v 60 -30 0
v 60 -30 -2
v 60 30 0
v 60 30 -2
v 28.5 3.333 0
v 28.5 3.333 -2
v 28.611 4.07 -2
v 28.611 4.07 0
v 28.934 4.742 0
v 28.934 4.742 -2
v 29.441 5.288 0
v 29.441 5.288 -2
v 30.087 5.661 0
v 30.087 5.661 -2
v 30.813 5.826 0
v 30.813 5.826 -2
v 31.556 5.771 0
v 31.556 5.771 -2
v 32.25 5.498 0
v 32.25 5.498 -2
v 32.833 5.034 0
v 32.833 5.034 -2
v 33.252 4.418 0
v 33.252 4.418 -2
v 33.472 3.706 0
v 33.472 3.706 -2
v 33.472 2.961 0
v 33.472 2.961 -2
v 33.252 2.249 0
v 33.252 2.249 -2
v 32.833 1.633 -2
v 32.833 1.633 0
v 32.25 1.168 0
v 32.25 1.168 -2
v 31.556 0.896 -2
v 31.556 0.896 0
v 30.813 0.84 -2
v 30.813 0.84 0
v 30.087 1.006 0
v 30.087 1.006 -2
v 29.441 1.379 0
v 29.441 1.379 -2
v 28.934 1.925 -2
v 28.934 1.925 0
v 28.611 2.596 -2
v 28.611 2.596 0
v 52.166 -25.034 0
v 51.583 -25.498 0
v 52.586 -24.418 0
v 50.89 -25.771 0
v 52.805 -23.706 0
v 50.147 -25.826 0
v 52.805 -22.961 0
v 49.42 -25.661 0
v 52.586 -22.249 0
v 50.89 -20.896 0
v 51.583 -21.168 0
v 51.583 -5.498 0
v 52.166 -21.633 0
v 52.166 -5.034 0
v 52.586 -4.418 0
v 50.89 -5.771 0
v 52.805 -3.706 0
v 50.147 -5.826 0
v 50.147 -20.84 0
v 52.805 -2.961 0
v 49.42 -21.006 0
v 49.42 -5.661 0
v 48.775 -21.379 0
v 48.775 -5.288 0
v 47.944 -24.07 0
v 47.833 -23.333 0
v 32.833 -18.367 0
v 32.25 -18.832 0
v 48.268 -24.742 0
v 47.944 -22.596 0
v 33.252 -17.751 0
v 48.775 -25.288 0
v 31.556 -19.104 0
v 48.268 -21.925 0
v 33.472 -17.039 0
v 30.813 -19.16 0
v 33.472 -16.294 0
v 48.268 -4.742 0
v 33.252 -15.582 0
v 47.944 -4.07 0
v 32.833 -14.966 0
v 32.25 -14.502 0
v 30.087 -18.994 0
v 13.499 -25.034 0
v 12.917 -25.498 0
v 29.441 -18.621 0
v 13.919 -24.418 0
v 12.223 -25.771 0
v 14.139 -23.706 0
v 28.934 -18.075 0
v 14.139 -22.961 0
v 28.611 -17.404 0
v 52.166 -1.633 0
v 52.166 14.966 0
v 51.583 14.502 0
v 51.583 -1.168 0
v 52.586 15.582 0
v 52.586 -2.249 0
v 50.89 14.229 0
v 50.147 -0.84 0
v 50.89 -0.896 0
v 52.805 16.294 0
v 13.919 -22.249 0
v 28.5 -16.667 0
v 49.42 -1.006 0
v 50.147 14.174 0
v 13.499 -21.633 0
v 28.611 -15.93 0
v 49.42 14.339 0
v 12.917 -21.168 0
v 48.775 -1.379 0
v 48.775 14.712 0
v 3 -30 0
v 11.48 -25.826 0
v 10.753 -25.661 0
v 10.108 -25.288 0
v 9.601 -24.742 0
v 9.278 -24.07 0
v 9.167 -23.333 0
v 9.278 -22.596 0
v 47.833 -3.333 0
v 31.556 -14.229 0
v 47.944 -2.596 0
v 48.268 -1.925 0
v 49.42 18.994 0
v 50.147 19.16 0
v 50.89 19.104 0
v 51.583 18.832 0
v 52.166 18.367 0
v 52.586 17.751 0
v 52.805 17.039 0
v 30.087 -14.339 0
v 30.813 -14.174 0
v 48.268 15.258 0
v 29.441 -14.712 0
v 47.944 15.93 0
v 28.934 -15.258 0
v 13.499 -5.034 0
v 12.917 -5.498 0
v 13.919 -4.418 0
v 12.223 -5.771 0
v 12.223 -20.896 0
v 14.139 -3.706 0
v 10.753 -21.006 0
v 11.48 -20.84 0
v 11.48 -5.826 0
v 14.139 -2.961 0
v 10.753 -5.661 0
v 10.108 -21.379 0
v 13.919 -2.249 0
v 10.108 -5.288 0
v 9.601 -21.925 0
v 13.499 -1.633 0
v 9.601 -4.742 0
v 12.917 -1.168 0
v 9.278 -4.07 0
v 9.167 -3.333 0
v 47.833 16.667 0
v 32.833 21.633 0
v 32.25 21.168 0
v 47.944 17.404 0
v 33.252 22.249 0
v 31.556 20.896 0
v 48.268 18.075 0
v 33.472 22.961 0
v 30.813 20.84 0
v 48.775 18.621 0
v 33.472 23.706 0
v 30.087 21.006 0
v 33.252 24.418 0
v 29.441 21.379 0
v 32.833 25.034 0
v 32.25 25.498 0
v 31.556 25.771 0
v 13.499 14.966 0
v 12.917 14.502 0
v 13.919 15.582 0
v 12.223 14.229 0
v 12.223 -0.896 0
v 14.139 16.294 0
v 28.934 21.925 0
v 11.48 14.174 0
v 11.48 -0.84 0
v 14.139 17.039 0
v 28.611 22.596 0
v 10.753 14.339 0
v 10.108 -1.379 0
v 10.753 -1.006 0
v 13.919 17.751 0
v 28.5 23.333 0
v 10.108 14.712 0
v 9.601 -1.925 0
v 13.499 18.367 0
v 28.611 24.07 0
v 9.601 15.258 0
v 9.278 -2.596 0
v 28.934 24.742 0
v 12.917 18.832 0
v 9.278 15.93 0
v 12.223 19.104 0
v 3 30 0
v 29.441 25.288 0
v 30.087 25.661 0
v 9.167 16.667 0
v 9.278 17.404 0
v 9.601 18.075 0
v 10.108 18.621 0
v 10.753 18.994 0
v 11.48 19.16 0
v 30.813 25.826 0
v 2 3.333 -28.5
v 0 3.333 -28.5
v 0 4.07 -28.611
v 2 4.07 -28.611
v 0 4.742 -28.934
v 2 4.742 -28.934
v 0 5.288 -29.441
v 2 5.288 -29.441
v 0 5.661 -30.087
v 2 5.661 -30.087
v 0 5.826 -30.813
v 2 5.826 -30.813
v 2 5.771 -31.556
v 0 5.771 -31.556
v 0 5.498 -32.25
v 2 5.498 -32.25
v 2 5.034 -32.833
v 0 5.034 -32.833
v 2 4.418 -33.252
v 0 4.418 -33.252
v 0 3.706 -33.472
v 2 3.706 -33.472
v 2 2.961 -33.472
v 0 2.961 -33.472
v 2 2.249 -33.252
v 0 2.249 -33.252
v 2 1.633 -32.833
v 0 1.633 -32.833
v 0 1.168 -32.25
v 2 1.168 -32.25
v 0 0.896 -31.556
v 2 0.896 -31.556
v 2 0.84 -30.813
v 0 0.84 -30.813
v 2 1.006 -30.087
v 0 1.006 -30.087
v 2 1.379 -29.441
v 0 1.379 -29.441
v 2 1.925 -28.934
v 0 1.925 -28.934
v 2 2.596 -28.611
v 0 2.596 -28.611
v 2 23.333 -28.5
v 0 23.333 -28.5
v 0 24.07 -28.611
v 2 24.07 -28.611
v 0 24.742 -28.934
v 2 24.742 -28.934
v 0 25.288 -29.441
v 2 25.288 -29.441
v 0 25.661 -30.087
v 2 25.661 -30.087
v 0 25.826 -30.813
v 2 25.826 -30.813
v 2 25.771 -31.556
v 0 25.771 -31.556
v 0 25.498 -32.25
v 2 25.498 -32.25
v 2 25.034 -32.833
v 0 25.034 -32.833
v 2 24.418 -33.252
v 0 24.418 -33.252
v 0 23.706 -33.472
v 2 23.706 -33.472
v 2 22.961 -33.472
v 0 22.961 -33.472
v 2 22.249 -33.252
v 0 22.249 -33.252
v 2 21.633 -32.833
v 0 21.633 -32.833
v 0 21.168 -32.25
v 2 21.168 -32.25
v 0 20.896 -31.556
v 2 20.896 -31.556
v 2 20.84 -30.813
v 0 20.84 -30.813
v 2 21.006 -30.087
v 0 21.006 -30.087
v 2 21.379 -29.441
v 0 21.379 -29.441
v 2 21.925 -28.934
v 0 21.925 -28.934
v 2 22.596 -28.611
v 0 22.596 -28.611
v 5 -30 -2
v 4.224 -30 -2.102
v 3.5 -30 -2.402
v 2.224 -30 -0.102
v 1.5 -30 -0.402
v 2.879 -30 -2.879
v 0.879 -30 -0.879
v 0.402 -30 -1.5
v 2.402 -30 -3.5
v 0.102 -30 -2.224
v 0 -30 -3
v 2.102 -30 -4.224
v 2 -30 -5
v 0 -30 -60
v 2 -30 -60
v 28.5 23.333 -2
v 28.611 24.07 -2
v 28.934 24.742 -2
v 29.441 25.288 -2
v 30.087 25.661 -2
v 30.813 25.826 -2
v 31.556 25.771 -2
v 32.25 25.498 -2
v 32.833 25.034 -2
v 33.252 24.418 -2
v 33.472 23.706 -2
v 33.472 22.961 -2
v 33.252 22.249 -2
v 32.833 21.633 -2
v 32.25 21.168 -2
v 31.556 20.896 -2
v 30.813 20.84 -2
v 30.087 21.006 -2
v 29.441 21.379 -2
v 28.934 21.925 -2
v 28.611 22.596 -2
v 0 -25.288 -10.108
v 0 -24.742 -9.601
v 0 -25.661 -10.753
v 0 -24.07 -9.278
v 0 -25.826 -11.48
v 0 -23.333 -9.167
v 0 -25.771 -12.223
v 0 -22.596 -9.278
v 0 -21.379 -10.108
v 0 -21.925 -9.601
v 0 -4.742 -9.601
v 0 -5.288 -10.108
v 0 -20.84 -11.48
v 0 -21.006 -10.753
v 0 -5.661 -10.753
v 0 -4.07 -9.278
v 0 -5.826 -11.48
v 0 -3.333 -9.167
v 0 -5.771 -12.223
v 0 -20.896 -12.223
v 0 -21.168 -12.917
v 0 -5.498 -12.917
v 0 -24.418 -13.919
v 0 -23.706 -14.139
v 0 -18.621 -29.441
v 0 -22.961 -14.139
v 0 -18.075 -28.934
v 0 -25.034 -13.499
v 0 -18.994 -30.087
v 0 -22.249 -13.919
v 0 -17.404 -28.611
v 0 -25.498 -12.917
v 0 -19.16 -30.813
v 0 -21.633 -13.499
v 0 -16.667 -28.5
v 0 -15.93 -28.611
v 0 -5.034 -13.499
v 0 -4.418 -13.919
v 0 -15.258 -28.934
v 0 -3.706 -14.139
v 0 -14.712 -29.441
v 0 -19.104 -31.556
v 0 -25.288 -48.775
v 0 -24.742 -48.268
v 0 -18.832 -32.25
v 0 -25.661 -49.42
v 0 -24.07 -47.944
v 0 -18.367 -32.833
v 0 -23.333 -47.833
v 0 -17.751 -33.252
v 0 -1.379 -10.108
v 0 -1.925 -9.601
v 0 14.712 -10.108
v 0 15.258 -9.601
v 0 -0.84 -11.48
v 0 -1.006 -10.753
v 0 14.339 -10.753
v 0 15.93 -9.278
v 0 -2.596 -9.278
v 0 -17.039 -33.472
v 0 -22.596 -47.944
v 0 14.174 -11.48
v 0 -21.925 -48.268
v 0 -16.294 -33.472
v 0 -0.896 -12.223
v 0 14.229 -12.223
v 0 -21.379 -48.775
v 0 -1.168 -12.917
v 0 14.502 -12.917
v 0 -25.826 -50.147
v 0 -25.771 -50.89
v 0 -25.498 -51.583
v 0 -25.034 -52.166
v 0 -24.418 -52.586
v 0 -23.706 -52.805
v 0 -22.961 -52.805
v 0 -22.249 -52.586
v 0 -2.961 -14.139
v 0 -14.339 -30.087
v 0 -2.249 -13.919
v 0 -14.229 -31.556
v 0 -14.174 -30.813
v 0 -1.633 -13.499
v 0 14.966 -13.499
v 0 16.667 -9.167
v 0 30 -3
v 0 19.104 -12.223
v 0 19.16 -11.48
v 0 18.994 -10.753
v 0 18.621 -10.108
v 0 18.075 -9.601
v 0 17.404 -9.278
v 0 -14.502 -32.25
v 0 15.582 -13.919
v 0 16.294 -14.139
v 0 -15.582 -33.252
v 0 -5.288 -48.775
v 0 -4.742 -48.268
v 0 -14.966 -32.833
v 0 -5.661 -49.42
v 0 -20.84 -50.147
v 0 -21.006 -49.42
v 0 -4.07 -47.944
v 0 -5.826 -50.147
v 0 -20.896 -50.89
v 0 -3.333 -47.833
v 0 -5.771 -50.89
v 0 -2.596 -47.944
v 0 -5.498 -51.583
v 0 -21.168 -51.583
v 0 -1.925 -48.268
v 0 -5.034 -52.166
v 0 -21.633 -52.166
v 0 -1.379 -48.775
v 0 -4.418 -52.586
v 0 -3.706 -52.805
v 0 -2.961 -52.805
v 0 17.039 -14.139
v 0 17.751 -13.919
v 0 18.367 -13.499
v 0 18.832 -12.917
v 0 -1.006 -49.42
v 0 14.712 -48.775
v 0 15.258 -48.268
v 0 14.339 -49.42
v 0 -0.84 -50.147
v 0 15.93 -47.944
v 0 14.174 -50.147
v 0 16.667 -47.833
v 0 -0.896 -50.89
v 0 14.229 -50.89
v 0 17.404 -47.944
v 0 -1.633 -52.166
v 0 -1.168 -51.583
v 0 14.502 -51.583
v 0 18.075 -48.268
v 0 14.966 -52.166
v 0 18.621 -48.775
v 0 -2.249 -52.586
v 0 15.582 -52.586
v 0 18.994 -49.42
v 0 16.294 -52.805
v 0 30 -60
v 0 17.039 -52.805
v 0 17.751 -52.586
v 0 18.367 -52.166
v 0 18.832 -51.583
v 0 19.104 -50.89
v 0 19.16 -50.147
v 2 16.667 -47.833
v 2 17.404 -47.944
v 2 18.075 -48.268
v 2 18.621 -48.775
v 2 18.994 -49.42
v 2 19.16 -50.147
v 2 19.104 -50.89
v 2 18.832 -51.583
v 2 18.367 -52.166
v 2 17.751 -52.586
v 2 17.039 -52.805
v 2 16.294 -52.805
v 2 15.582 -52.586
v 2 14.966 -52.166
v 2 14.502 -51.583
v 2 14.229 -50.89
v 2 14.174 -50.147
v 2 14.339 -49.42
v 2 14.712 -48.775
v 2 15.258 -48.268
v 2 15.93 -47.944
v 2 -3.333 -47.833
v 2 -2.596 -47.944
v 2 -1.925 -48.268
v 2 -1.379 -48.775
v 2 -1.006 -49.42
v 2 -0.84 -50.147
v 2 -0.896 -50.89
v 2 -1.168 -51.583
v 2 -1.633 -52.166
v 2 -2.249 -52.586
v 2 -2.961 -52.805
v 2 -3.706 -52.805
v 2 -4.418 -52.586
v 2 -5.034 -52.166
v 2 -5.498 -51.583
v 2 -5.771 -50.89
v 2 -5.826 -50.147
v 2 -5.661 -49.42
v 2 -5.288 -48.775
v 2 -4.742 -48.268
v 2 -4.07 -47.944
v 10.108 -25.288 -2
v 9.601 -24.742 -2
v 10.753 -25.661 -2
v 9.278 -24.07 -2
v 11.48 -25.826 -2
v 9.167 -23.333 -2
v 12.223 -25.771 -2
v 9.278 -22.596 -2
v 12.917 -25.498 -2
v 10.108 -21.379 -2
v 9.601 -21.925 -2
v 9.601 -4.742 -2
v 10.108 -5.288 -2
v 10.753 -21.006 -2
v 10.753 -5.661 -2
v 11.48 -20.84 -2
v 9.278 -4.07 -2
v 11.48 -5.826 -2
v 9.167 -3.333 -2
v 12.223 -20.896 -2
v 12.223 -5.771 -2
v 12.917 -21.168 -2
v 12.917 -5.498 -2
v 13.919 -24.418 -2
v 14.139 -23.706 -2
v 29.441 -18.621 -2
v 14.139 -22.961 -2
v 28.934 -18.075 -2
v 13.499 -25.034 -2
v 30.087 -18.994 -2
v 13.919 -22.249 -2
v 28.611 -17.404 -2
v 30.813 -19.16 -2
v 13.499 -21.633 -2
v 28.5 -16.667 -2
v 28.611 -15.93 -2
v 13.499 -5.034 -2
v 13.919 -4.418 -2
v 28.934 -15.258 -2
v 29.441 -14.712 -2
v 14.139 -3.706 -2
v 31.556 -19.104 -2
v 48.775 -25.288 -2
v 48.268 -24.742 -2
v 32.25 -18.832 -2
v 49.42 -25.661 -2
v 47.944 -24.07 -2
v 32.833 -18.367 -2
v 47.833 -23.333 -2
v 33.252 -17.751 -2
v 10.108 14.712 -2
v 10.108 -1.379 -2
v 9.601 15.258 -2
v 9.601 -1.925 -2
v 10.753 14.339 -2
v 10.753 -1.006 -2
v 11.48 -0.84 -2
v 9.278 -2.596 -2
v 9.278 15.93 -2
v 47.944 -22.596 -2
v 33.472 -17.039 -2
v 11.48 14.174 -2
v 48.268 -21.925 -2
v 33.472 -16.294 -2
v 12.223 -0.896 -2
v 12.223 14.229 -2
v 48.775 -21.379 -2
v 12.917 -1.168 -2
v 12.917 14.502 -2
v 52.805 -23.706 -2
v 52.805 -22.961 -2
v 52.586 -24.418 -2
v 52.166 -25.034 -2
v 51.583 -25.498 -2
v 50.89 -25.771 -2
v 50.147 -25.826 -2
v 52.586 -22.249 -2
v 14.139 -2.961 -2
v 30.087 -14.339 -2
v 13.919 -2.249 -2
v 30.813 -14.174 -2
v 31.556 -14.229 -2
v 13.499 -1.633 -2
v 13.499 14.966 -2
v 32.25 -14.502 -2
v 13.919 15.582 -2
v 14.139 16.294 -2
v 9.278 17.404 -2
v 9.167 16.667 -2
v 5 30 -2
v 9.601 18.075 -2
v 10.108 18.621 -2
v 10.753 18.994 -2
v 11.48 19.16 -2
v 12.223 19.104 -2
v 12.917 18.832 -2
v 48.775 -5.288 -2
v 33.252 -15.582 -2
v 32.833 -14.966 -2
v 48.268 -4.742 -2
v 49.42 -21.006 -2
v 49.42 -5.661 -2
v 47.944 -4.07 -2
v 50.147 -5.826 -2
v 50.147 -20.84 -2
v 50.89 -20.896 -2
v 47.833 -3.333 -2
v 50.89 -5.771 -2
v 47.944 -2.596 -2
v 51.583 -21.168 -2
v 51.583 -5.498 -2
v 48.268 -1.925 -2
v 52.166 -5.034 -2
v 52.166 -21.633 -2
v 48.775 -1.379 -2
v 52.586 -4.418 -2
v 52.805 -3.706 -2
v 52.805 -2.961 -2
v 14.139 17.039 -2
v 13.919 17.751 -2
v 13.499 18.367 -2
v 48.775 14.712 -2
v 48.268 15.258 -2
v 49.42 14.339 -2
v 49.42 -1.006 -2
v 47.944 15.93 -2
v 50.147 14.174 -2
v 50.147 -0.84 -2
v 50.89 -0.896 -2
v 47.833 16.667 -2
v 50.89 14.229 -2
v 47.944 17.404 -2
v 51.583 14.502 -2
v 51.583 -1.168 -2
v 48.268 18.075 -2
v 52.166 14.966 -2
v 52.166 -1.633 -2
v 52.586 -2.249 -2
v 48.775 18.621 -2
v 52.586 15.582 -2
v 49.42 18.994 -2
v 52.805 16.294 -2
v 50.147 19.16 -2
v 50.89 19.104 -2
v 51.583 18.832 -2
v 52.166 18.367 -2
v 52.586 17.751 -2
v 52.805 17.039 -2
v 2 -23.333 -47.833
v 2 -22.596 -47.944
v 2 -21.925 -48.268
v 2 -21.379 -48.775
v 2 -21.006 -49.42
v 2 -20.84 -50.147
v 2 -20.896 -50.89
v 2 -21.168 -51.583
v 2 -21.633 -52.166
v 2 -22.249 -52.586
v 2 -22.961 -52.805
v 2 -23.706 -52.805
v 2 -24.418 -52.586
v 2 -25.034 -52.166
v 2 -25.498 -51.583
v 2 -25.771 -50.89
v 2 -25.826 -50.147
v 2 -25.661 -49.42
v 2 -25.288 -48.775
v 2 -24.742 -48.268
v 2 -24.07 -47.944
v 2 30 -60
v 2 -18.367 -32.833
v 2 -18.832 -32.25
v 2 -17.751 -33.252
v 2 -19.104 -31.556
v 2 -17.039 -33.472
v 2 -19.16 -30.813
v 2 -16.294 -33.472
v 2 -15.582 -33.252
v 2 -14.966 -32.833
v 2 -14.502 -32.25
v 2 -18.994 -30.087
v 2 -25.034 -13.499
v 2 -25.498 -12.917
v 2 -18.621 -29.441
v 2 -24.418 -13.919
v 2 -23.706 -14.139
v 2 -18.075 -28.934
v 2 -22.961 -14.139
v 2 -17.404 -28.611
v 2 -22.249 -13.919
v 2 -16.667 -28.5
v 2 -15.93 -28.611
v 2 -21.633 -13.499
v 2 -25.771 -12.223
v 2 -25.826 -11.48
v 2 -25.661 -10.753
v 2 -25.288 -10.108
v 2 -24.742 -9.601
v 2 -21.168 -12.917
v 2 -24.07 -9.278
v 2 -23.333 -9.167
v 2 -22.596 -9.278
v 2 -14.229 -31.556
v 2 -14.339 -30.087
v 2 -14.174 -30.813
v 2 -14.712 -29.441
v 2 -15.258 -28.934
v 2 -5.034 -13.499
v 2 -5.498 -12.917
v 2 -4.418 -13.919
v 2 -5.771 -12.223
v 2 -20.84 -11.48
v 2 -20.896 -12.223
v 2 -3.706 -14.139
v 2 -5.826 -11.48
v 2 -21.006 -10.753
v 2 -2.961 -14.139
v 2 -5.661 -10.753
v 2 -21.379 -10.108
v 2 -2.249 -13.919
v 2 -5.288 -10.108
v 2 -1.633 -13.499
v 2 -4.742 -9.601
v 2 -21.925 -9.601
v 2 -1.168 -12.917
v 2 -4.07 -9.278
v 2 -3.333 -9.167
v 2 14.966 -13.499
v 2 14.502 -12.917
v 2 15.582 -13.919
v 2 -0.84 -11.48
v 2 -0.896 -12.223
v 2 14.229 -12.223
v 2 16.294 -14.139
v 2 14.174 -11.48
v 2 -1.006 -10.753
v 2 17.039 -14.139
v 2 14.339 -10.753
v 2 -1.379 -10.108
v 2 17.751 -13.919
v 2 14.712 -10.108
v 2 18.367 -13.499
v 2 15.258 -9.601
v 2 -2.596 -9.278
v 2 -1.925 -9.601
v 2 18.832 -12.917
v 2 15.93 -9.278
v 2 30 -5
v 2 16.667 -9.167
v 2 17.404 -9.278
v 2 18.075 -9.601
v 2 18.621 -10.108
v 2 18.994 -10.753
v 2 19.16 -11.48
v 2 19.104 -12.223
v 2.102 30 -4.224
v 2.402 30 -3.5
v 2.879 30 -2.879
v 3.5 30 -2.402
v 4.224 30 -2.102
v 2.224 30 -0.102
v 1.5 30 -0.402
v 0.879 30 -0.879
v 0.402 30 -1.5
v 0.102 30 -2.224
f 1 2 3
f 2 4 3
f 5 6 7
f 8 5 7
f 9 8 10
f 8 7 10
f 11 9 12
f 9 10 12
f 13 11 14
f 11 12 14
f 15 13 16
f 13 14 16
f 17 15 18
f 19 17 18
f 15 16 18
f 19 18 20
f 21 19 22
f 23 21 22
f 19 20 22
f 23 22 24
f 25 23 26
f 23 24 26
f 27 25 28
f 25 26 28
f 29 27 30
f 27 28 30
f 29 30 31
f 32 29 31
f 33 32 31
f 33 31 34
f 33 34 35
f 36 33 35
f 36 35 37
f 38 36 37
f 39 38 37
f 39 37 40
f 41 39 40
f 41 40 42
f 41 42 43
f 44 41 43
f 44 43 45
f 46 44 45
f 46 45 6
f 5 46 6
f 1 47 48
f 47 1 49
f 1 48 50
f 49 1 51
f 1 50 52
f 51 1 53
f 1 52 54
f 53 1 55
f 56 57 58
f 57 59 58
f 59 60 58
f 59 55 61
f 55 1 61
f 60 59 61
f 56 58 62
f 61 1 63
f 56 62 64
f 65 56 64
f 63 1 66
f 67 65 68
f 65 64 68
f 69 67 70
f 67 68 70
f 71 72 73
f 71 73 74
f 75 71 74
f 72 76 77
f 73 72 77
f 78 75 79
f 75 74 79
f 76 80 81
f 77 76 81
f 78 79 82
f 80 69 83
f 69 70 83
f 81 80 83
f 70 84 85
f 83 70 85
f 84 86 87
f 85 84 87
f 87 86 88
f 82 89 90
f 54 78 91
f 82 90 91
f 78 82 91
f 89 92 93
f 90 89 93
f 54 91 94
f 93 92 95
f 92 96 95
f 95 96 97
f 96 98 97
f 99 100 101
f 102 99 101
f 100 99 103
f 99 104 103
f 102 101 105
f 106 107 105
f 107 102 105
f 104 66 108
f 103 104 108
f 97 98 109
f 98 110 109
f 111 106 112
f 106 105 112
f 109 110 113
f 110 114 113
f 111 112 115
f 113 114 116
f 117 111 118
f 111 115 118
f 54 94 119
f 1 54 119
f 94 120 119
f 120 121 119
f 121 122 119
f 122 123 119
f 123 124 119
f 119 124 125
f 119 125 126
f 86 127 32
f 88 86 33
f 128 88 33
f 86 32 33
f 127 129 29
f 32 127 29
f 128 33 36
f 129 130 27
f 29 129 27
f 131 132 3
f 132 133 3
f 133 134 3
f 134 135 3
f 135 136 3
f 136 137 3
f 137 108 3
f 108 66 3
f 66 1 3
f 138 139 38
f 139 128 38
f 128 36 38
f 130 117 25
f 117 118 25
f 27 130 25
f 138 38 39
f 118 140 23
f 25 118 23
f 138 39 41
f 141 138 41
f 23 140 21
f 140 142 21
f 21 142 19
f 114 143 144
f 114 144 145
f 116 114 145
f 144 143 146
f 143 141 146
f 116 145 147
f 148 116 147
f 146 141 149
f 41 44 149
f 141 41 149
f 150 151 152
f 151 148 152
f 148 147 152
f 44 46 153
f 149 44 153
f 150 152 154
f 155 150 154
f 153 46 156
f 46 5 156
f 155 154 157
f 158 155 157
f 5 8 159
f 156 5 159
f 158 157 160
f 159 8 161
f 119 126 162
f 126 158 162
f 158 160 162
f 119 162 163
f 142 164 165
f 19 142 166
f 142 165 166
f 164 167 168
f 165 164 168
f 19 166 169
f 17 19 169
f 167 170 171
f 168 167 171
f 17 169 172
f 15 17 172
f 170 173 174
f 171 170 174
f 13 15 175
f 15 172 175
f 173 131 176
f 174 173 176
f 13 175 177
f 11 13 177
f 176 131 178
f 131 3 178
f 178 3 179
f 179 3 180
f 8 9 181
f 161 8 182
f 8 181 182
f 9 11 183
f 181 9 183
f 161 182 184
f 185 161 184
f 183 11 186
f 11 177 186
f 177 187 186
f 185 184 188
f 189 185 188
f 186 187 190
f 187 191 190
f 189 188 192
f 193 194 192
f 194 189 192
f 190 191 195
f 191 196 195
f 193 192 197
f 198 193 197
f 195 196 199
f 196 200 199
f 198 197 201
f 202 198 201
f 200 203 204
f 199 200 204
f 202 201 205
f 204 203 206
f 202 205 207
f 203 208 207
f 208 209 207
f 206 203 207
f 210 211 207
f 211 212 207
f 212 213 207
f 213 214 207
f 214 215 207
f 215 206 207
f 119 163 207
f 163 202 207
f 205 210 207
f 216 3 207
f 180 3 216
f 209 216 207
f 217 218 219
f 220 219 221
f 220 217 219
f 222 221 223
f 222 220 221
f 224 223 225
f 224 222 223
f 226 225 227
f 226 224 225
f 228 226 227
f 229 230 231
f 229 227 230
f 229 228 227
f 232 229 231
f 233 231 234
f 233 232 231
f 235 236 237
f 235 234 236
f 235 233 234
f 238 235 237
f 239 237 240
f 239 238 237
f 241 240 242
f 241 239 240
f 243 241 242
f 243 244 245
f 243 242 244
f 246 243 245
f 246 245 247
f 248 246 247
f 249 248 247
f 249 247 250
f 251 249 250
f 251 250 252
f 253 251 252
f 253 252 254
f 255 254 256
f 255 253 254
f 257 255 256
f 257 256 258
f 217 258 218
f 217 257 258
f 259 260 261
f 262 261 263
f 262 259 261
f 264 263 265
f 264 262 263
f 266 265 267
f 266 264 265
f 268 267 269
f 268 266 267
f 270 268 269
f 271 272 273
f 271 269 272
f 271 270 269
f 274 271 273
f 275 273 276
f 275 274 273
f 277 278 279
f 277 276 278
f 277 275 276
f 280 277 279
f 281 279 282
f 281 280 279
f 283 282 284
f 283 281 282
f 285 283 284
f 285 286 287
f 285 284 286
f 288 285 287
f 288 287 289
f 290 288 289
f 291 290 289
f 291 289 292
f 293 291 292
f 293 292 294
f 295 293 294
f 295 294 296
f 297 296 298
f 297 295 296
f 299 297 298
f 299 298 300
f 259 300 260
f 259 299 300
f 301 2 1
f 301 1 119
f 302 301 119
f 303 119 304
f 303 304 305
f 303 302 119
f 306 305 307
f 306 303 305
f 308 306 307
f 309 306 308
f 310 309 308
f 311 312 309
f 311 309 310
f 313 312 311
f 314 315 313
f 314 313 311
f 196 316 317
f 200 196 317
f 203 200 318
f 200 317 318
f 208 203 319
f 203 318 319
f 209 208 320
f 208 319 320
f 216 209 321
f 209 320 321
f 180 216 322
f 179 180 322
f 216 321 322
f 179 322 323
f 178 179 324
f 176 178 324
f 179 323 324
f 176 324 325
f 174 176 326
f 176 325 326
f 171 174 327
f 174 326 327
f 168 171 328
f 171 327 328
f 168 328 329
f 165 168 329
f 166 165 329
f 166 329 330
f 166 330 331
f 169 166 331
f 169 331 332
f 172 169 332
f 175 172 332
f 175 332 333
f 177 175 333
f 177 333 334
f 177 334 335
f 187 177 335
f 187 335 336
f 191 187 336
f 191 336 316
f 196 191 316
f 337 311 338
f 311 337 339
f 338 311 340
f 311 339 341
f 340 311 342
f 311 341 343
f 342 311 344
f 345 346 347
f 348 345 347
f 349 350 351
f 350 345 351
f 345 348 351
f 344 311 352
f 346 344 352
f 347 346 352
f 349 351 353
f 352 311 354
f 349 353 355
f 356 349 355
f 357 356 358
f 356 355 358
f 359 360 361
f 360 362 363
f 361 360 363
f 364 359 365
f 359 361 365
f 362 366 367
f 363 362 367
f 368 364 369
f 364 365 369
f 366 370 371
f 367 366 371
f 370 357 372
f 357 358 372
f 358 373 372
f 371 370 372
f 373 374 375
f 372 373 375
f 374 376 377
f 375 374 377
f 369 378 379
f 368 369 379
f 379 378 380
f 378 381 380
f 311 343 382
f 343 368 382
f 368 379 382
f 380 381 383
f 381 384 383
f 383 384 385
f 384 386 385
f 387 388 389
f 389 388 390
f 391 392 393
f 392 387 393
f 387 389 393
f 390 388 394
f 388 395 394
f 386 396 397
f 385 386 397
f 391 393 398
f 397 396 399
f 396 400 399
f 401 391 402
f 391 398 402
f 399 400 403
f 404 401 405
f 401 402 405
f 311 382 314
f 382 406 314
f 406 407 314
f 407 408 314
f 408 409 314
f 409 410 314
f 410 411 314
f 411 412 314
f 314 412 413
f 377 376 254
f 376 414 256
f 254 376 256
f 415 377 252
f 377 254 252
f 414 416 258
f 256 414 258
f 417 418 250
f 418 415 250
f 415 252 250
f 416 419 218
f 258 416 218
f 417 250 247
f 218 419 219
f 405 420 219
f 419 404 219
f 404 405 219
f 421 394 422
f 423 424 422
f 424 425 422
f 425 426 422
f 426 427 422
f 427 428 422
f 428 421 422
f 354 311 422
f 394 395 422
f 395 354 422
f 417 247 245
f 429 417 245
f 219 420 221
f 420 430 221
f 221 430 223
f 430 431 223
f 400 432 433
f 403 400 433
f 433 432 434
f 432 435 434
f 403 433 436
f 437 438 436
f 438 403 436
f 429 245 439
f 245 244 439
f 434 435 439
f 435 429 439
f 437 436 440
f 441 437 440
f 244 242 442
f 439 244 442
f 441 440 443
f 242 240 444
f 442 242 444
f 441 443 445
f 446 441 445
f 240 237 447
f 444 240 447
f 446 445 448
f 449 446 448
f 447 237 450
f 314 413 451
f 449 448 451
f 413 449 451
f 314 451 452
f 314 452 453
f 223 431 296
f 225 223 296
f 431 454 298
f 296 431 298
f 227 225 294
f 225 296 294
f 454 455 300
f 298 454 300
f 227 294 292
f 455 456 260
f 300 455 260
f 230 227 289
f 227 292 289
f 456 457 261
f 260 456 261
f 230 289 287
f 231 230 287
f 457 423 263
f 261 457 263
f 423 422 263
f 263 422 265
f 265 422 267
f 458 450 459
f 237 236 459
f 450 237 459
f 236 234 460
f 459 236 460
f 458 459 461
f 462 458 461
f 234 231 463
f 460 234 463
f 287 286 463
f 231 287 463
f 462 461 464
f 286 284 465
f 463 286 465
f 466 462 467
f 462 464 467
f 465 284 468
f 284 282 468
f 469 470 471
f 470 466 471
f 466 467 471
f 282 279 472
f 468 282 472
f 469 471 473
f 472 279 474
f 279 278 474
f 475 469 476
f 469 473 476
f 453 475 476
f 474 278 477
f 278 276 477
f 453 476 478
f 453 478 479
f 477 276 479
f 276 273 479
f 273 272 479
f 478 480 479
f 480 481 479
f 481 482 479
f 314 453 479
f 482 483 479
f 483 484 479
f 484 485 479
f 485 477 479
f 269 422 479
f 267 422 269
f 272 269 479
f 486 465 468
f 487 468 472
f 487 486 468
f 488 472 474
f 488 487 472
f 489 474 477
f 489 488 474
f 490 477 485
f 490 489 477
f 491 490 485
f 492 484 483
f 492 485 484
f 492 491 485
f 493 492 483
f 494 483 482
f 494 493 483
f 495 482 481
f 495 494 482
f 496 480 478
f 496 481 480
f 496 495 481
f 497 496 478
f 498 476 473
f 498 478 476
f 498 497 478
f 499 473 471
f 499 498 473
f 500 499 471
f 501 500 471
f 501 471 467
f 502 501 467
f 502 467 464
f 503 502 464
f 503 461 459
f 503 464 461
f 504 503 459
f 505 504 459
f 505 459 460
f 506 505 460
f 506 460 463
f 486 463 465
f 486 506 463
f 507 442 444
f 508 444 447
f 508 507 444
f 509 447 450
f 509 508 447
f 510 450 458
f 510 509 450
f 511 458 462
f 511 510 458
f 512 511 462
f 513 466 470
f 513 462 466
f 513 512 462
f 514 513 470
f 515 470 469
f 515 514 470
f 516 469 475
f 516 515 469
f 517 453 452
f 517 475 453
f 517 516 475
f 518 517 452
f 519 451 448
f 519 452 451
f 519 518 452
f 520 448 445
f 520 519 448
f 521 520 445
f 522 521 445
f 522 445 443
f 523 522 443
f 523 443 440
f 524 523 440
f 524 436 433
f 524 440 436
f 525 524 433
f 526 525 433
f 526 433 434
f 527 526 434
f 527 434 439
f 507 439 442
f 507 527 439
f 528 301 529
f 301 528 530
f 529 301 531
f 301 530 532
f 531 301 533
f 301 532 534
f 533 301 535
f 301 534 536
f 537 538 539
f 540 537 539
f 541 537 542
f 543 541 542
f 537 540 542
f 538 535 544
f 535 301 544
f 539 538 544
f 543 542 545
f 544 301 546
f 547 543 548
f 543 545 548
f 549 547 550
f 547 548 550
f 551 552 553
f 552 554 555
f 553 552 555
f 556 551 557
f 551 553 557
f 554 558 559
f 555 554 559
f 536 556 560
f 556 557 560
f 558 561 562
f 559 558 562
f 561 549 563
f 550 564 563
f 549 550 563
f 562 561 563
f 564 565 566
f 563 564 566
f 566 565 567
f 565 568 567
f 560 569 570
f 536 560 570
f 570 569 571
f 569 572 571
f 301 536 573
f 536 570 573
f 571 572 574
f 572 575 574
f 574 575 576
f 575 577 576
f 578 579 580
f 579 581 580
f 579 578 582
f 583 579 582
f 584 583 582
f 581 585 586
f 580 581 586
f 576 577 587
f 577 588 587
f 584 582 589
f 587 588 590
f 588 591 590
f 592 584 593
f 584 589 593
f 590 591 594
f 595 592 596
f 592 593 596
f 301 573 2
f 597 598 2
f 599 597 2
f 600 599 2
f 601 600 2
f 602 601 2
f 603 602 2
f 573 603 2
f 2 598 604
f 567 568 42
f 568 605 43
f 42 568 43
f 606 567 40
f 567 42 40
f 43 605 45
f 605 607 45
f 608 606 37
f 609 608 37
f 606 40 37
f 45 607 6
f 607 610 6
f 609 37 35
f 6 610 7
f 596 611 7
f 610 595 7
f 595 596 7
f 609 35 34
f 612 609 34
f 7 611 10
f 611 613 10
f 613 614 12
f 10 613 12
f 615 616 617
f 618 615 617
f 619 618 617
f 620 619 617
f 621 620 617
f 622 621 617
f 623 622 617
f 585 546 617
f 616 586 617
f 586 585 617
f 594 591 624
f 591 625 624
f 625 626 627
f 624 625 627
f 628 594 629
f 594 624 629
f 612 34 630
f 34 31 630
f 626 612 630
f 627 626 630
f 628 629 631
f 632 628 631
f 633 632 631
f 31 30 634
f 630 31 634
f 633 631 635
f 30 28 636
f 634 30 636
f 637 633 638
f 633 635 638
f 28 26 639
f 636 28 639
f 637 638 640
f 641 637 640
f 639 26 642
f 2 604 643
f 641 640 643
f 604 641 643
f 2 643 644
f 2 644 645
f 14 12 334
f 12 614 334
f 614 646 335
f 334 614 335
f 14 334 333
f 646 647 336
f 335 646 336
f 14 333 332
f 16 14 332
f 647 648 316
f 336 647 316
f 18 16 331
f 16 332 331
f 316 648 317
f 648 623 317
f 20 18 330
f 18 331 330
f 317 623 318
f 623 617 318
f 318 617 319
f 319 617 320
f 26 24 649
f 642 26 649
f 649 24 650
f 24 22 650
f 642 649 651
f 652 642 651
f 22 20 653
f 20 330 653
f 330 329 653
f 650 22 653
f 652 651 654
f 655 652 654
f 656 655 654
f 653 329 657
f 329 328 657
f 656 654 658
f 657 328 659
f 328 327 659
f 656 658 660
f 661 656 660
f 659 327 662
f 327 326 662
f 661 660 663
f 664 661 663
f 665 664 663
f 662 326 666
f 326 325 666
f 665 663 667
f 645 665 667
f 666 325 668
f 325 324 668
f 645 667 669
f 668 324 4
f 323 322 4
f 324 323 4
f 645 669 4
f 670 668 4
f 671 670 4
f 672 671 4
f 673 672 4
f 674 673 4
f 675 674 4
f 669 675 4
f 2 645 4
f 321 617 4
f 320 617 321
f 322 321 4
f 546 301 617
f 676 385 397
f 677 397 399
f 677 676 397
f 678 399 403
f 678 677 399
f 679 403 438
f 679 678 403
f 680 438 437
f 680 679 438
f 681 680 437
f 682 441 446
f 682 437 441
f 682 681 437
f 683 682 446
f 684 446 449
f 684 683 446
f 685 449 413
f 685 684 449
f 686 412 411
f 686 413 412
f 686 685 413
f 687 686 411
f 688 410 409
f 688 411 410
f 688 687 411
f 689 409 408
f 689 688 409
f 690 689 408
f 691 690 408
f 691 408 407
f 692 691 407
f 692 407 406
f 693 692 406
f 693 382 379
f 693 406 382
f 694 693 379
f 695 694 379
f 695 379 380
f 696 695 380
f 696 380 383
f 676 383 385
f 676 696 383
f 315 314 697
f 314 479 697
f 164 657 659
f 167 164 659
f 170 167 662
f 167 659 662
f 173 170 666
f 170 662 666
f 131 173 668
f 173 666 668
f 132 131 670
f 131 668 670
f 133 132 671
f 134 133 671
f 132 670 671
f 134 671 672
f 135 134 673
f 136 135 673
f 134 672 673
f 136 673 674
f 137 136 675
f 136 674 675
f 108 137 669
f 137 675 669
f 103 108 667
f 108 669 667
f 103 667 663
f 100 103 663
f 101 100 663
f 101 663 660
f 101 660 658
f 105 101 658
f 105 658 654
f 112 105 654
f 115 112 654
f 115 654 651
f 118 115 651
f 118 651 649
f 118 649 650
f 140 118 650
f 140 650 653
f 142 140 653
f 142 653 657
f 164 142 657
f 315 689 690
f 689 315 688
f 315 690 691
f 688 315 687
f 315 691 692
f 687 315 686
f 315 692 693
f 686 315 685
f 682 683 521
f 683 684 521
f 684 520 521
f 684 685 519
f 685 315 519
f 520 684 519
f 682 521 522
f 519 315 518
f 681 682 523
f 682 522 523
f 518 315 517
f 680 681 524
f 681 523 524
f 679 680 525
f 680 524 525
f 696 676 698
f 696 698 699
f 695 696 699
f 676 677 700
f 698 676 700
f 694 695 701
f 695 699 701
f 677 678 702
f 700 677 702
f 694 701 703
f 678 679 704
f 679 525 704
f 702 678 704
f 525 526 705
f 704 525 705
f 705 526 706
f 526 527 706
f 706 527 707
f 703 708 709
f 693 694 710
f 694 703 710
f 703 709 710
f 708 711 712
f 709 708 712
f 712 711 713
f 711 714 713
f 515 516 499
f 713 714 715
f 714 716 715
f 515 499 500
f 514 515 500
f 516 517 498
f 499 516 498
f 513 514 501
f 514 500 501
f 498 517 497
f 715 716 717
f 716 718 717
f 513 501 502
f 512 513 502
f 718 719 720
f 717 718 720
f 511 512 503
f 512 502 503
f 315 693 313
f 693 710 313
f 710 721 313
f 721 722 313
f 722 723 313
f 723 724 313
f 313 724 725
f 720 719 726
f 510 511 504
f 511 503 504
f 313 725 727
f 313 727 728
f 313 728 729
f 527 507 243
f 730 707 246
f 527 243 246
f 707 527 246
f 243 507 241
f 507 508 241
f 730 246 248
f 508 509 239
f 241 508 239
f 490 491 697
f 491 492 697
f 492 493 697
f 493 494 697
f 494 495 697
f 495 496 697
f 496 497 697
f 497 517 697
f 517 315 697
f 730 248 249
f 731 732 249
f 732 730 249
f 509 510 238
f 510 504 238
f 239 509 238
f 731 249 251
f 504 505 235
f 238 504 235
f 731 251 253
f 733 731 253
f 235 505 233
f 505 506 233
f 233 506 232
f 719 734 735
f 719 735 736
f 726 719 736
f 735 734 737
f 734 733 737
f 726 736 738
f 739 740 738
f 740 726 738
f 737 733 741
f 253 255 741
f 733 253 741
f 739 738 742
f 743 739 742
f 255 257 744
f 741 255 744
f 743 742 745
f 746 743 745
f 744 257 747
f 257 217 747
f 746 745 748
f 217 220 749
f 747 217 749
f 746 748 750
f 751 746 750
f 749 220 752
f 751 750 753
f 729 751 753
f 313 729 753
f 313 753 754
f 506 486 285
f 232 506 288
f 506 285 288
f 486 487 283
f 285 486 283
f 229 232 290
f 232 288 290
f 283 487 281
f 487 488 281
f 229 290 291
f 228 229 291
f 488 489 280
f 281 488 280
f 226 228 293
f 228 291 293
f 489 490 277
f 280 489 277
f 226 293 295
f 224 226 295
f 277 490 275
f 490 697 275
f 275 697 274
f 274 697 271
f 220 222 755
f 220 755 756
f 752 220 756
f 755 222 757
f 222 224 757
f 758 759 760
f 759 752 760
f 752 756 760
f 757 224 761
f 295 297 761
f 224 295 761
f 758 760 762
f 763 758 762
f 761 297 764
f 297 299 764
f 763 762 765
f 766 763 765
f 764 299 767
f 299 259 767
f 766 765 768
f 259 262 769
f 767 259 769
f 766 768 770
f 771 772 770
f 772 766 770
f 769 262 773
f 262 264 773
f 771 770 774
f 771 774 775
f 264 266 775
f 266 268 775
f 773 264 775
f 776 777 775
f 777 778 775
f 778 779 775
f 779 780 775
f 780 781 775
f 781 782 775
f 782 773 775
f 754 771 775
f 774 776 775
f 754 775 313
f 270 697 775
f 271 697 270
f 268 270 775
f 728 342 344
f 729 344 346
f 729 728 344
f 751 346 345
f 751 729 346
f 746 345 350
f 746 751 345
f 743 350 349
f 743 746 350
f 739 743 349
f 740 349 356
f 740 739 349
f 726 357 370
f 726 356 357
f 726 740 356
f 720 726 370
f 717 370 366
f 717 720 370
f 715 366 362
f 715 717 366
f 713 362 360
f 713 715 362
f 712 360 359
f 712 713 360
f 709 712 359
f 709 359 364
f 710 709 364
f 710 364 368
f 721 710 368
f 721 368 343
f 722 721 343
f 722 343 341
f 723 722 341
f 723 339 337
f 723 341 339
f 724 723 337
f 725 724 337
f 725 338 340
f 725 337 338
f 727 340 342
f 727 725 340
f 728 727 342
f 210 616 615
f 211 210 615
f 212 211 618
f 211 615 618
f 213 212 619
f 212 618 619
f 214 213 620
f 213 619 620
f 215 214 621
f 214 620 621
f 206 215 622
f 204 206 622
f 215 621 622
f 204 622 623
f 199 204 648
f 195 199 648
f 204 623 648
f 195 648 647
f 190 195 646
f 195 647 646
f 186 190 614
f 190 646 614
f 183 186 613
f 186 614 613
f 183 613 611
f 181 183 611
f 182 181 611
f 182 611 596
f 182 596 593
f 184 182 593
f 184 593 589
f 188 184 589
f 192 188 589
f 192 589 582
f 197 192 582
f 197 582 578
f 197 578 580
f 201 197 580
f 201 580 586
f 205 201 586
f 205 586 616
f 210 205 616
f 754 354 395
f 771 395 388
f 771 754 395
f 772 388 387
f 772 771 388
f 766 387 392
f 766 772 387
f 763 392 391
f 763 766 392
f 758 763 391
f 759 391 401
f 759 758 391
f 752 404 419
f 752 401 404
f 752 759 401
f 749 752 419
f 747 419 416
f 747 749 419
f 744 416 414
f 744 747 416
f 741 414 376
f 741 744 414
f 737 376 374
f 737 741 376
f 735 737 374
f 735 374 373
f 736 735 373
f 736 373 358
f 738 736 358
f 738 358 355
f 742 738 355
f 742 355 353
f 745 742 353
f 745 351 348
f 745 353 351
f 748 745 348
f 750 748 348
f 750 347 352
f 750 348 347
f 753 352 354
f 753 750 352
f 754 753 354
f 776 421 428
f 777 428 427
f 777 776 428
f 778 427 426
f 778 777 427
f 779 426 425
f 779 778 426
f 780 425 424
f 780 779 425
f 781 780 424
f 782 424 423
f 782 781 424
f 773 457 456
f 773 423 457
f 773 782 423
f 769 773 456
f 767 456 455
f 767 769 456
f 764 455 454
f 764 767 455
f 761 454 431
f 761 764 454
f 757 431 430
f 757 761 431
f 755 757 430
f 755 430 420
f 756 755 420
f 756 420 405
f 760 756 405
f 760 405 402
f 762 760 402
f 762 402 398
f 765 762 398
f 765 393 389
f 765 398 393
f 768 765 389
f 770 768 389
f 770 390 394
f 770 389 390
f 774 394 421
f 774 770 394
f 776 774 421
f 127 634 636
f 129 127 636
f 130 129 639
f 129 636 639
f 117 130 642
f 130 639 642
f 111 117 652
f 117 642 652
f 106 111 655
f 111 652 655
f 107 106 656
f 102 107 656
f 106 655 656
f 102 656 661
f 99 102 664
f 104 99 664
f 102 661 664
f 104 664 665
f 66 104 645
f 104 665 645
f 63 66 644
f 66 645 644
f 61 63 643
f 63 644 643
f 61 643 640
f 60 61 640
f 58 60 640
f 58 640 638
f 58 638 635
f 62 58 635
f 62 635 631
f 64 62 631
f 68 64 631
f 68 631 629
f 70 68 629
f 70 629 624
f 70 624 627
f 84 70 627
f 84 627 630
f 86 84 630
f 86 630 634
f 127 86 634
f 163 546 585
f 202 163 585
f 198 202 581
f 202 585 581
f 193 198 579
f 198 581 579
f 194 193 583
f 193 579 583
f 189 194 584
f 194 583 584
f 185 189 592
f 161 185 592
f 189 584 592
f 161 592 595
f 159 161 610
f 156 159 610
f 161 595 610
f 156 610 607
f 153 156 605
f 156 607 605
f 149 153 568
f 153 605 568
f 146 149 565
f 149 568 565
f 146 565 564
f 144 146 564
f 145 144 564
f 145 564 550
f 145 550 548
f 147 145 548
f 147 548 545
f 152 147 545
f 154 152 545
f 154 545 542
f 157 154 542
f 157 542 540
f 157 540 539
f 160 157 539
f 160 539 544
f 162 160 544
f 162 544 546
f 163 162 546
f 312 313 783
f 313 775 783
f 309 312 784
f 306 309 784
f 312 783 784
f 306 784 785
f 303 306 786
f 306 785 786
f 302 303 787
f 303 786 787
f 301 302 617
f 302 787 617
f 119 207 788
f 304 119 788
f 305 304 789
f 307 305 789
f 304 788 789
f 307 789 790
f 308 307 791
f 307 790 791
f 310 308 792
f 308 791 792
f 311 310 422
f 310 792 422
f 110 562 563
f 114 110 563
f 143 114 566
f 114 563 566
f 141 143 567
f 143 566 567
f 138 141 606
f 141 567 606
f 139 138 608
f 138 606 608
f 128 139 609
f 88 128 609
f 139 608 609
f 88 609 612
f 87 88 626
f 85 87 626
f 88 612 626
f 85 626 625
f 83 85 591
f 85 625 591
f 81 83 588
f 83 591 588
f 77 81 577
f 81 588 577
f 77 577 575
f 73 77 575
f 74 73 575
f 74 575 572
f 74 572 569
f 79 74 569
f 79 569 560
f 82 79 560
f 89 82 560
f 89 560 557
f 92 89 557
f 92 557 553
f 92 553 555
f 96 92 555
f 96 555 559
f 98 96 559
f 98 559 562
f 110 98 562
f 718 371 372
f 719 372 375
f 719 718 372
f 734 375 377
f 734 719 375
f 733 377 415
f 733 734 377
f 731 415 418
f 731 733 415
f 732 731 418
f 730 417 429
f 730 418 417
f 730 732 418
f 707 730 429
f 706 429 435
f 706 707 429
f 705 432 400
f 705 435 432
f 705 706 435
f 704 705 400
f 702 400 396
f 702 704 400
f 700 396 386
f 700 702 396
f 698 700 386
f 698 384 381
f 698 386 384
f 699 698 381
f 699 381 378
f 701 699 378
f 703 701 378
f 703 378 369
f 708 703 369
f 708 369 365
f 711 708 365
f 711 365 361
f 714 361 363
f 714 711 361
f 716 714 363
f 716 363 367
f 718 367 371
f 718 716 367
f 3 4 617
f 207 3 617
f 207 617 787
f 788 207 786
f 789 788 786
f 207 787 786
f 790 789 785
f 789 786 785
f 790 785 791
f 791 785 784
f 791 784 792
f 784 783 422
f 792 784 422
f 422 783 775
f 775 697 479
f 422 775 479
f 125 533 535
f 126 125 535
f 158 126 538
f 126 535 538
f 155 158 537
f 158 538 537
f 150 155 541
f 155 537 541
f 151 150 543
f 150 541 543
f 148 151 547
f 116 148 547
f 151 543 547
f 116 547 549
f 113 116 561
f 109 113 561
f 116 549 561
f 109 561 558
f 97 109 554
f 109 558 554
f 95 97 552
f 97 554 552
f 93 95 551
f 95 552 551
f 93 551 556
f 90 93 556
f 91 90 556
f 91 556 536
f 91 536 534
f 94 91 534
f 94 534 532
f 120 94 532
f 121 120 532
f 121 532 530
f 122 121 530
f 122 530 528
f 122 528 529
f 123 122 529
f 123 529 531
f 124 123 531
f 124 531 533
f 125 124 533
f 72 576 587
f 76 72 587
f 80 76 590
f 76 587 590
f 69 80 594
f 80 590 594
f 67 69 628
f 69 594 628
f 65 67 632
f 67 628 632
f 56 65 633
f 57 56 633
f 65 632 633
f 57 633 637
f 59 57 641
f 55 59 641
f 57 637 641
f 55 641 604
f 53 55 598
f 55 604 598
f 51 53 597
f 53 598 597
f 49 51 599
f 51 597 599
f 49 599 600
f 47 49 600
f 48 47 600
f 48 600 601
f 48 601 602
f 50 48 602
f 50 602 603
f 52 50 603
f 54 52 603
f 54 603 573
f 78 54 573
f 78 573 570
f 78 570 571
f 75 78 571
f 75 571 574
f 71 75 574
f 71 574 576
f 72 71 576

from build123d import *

# Parameters (mm, degrees)
BOSS_EXTRUDE1_DEPTH = 30
SKETCH2_R           = 2.5
CUT_EXTRUDE1_DEPTH  = 10


with BuildPart() as part:
    # Sketch1 → Boss-Extrude1 (new, symmetric)
    with BuildSketch(Plane(origin=(0, 0, 0), x_dir=(1, 0, 0), z_dir=(0, 1, 0))):
        with BuildLine():
            Line((0, 3), (0, 60))
            Line((0, 60), (2, 60))
            Line((2, 60), (2, 5))
            ThreePointArc((2, 5), (2.878679656, 2.878679656), (5, 2))
            Line((5, 2), (60, 2))
            Line((60, 2), (60, 0))
            Line((60, 0), (3, 0))
            ThreePointArc((3, 0), (0.878679656, 0.878679656), (0, 3))
        make_face()
    extrude(amount=BOSS_EXTRUDE1_DEPTH, both=True)

    # Sketch2 → Cut-Extrude1 (cut)
    with BuildSketch(Plane(origin=(0, 0, -2), x_dir=(-1, 0, 0), z_dir=(0, 0, -1))):
        with Locations((-50.333333333, -23.333333333)):
            Circle(SKETCH2_R)
        with Locations((-50.333333333, -3.333333333)):
            Circle(SKETCH2_R)
        with Locations((-50.333333333, 16.666666667)):
            Circle(SKETCH2_R)
        with Locations((-31, 23.333333333)):
            Circle(SKETCH2_R)
        with Locations((-31, 3.333333333)):
            Circle(SKETCH2_R)
        with Locations((-31, -16.666666667)):
            Circle(SKETCH2_R)
        with Locations((-11.666666667, -23.333333333)):
            Circle(SKETCH2_R)
        with Locations((-11.666666667, -3.333333333)):
            Circle(SKETCH2_R)
        with Locations((-11.666666667, 16.666666667)):
            Circle(SKETCH2_R)
    cut_extrude1 = extrude(amount=-CUT_EXTRUDE1_DEPTH, mode=Mode.SUBTRACT)

    # Mirror9: Cut-Extrude1 across plane
    add(cut_extrude1.mirror(Plane(origin=(0, 0, 0), x_dir=(-0.7071067811865488, 0, 0.7071067811865462), z_dir=(0.7071067811865465, 0, 0.7071067811865487))), mode=Mode.SUBTRACT)


solid = part.part
